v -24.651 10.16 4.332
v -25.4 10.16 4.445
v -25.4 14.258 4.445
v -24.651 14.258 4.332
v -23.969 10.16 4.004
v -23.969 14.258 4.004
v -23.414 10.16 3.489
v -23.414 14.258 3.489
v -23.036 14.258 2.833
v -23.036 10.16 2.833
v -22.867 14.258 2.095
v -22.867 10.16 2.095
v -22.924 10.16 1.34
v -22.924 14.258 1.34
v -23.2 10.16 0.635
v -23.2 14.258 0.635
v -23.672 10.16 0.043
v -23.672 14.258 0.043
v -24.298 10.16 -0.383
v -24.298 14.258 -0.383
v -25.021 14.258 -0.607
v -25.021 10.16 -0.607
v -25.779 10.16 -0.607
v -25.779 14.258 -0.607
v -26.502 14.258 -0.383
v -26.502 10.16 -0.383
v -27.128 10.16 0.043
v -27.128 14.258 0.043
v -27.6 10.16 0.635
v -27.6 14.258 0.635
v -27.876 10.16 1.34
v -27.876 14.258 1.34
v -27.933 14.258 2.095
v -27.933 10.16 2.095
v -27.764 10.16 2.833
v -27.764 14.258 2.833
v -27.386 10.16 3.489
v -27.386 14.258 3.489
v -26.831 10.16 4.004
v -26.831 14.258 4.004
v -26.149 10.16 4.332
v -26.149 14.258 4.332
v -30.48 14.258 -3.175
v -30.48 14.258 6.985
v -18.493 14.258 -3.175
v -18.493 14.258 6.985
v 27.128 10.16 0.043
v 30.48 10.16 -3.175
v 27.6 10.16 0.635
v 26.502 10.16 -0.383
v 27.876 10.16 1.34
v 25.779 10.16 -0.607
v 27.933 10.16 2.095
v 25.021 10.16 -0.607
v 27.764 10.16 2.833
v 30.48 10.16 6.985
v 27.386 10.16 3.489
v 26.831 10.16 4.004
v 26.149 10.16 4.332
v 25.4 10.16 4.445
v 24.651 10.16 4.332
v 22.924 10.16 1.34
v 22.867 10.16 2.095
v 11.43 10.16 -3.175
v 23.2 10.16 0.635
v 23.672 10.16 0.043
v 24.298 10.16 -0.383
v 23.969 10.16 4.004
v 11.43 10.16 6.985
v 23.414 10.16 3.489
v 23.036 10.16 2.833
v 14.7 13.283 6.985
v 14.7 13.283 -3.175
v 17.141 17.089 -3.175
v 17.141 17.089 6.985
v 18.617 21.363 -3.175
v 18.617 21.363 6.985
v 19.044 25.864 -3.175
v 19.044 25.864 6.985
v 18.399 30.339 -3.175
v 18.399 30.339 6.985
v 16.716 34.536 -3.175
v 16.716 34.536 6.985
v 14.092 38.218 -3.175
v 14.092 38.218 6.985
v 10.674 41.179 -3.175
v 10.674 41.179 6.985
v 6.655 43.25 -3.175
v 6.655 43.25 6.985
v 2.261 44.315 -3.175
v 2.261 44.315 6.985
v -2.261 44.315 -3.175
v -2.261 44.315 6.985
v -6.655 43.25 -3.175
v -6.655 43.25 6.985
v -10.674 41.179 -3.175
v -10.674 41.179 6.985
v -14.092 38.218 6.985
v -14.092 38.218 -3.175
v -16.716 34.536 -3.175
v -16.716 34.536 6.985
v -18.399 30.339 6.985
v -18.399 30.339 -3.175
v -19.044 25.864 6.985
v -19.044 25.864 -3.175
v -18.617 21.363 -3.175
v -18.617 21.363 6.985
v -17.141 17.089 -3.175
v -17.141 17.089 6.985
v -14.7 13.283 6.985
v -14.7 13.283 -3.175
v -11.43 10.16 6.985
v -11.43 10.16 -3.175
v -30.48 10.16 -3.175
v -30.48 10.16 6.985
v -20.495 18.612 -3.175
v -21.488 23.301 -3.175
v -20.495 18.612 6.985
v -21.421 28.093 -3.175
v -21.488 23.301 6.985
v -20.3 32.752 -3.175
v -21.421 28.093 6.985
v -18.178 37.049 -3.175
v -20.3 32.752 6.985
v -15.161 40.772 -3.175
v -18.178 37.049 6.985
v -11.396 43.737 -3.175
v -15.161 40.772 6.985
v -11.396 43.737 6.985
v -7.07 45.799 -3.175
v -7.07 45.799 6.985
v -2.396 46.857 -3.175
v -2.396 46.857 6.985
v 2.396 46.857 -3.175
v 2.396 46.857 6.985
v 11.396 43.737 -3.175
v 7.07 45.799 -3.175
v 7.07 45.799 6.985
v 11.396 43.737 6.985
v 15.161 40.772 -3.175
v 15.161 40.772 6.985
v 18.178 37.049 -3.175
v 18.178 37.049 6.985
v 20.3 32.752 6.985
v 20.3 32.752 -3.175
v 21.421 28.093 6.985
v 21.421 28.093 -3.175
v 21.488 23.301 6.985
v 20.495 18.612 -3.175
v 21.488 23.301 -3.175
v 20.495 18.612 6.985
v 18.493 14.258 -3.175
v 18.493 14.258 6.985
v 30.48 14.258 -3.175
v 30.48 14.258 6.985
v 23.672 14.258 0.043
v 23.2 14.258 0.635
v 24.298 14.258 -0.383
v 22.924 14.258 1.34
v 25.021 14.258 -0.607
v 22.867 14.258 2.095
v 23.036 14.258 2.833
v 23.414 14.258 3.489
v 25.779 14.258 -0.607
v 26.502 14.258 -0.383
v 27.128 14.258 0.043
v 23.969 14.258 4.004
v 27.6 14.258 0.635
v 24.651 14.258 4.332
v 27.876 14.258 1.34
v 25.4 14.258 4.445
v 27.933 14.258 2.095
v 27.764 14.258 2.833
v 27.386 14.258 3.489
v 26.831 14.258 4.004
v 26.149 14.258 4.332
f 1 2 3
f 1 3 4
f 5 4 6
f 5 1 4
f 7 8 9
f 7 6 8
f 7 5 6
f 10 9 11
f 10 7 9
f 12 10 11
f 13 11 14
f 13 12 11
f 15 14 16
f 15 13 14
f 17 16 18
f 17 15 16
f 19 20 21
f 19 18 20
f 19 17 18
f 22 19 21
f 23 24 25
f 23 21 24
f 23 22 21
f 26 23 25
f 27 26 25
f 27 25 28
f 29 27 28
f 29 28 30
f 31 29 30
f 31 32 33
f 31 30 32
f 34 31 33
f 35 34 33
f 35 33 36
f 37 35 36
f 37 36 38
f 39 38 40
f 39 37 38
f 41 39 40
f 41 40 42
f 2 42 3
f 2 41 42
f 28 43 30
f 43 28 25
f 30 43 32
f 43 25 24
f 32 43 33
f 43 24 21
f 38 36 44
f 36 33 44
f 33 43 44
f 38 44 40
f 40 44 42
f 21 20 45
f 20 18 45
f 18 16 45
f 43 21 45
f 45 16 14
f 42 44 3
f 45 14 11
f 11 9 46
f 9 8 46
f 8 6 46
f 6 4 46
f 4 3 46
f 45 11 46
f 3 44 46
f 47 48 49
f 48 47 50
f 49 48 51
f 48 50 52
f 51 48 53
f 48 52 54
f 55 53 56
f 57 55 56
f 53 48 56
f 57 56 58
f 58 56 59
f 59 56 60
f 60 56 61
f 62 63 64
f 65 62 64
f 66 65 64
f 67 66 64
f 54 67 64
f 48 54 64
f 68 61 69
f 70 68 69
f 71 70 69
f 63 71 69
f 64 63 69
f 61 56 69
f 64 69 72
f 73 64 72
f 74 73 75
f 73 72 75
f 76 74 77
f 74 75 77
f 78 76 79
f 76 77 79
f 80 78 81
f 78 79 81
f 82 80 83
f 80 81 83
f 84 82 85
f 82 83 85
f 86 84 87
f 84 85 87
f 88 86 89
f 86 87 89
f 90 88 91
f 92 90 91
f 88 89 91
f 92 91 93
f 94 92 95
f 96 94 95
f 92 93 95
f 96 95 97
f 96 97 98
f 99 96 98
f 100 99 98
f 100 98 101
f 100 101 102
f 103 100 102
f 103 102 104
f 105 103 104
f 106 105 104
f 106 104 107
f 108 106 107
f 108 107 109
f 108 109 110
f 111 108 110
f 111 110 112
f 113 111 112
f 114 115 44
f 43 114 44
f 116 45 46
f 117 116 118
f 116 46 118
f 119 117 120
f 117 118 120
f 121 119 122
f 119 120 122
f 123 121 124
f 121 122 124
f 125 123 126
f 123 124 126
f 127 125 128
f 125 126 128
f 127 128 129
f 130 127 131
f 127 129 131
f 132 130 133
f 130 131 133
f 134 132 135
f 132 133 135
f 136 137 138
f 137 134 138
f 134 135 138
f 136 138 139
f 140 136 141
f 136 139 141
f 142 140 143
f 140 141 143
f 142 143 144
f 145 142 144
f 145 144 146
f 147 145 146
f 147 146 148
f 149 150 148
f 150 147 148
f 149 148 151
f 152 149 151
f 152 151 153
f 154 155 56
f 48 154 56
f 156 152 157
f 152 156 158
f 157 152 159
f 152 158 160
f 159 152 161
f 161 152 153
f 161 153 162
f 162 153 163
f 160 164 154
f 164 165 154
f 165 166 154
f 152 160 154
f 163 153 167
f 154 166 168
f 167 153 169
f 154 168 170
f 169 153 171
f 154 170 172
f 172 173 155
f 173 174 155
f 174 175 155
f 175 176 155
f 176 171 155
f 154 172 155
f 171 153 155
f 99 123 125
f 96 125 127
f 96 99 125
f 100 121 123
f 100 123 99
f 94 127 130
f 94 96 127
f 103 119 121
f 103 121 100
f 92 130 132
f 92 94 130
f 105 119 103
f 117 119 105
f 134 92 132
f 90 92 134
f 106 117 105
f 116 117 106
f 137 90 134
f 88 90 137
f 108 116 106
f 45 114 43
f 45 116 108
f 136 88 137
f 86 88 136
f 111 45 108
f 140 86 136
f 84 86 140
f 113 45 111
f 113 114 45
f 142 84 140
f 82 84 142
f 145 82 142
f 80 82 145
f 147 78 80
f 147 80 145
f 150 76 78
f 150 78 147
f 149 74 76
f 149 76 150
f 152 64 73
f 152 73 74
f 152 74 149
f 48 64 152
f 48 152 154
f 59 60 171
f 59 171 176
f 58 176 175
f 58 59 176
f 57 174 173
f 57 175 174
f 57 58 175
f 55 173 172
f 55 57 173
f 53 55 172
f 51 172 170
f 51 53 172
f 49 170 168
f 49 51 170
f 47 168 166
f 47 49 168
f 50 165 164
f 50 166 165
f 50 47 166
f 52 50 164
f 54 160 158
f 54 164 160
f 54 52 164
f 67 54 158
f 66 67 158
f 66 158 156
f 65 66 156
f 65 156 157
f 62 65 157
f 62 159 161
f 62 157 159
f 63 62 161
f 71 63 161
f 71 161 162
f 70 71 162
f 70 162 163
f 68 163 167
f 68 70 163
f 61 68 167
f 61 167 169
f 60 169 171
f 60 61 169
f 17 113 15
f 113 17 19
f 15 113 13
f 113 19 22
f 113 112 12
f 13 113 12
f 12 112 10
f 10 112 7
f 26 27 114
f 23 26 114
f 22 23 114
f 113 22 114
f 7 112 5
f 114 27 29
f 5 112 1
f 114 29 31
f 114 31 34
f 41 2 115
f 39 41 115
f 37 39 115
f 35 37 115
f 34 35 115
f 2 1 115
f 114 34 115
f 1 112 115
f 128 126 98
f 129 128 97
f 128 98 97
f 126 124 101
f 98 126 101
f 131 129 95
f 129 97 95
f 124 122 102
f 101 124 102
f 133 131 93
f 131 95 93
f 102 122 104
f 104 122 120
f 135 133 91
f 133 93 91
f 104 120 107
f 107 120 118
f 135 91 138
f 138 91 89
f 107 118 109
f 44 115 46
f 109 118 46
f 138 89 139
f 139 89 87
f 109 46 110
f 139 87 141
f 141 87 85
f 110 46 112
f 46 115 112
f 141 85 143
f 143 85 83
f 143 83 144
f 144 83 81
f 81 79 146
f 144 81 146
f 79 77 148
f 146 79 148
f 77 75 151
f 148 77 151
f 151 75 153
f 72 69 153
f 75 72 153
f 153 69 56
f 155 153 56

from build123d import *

# Parameters (mm, degrees)
SKETCH1_W           = 38.1
SKETCH1_H           = 10.16
SKETCH1_W_2         = 12.7
SKETCH1_R           = 2.54
BOSS_EXTRUDE1_DEPTH = 50.8
SKETCH2_W           = 63.5
SKETCH2_H           = 50.8
CUT_EXTRUDE1_DEPTH  = 61.761238467


with BuildPart() as part:
    # Sketch1 → Boss-Extrude1 (new body)
    # profile 1 of 3: a face of its own
    with BuildSketch(Plane(origin=(0, 0, 0), x_dir=(1, 0, 0), z_dir=(0, 1, 0))):
        with Locations((0, -1.905)):
            Rectangle(SKETCH1_W, SKETCH1_H)
    # profile 2 of 3: a face of its own
    with BuildSketch(Plane(origin=(0, 0, 0), x_dir=(1, 0, 0), z_dir=(0, 1, 0))):
        with Locations((-25.4, -1.905)):
            Rectangle(SKETCH1_W_2, SKETCH1_H)
        with Locations(Location((-25.4, -1.905, 0), (0, 0, 270))):
            Circle(SKETCH1_R, mode=Mode.SUBTRACT)
    # profile 3 of 3: a face of its own
    with BuildSketch(Plane(origin=(0, 0, 0), x_dir=(1, 0, 0), z_dir=(0, 1, 0))):
        with Locations((25.4, -1.905)):
            Rectangle(SKETCH1_W_2, SKETCH1_H)
        with Locations(Location((25.4, -1.905, 0), (0, 0, 270))):
            Circle(SKETCH1_R, mode=Mode.SUBTRACT)
    extrude(amount=BOSS_EXTRUDE1_DEPTH)

    # Sketch2 → Cut-Extrude1 (cut, through all)
    # profile 1 of 2: a face of its own
    with BuildSketch(Plane.XY.offset(6.985)):
        with Locations((0, 25.4)):
            Rectangle(SKETCH2_W, SKETCH2_H)
        with BuildLine():
            Line((-11.43, 10.16), (-30.48, 10.16))
            Line((-30.48, 10.16), (-30.48, 14.258420741))
            Line((-30.48, 14.258420741), (-18.493061175, 14.258420741))
            ThreePointArc((-18.493061175, 14.258420741), (0, 46.99), (18.493061175, 14.258420741))
            Line((18.493061175, 14.258420741), (30.48, 14.258420741))
            Line((30.48, 14.258420741), (30.48, 10.16))
            Line((30.48, 10.16), (11.43, 10.16))
            ThreePointArc((11.43, 10.16), (0, 44.45), (-11.43, 10.16))
        make_face(mode=Mode.SUBTRACT)
    # profile 2 of 2: a face of its own
    with BuildSketch(Plane.XY.offset(6.985)):
        with Locations((0, 25.4)):
            Rectangle(SKETCH2_W, SKETCH2_H)
        with BuildLine():
            Line((-11.43, 10.16), (-30.48, 10.16))
            Line((-30.48, 10.16), (-30.48, 14.258420741))
            Line((-30.48, 14.258420741), (-18.493061175, 14.258420741))
            ThreePointArc((-18.493061175, 14.258420741), (0, 46.99), (18.493061175, 14.258420741))
            Line((18.493061175, 14.258420741), (30.48, 14.258420741))
            Line((30.48, 14.258420741), (30.48, 10.16))
            Line((30.48, 10.16), (11.43, 10.16))
            ThreePointArc((11.43, 10.16), (0, 44.45), (-11.43, 10.16))
        make_face(mode=Mode.SUBTRACT)
    extrude(amount=-CUT_EXTRUDE1_DEPTH, mode=Mode.SUBTRACT)


solid = part.part
